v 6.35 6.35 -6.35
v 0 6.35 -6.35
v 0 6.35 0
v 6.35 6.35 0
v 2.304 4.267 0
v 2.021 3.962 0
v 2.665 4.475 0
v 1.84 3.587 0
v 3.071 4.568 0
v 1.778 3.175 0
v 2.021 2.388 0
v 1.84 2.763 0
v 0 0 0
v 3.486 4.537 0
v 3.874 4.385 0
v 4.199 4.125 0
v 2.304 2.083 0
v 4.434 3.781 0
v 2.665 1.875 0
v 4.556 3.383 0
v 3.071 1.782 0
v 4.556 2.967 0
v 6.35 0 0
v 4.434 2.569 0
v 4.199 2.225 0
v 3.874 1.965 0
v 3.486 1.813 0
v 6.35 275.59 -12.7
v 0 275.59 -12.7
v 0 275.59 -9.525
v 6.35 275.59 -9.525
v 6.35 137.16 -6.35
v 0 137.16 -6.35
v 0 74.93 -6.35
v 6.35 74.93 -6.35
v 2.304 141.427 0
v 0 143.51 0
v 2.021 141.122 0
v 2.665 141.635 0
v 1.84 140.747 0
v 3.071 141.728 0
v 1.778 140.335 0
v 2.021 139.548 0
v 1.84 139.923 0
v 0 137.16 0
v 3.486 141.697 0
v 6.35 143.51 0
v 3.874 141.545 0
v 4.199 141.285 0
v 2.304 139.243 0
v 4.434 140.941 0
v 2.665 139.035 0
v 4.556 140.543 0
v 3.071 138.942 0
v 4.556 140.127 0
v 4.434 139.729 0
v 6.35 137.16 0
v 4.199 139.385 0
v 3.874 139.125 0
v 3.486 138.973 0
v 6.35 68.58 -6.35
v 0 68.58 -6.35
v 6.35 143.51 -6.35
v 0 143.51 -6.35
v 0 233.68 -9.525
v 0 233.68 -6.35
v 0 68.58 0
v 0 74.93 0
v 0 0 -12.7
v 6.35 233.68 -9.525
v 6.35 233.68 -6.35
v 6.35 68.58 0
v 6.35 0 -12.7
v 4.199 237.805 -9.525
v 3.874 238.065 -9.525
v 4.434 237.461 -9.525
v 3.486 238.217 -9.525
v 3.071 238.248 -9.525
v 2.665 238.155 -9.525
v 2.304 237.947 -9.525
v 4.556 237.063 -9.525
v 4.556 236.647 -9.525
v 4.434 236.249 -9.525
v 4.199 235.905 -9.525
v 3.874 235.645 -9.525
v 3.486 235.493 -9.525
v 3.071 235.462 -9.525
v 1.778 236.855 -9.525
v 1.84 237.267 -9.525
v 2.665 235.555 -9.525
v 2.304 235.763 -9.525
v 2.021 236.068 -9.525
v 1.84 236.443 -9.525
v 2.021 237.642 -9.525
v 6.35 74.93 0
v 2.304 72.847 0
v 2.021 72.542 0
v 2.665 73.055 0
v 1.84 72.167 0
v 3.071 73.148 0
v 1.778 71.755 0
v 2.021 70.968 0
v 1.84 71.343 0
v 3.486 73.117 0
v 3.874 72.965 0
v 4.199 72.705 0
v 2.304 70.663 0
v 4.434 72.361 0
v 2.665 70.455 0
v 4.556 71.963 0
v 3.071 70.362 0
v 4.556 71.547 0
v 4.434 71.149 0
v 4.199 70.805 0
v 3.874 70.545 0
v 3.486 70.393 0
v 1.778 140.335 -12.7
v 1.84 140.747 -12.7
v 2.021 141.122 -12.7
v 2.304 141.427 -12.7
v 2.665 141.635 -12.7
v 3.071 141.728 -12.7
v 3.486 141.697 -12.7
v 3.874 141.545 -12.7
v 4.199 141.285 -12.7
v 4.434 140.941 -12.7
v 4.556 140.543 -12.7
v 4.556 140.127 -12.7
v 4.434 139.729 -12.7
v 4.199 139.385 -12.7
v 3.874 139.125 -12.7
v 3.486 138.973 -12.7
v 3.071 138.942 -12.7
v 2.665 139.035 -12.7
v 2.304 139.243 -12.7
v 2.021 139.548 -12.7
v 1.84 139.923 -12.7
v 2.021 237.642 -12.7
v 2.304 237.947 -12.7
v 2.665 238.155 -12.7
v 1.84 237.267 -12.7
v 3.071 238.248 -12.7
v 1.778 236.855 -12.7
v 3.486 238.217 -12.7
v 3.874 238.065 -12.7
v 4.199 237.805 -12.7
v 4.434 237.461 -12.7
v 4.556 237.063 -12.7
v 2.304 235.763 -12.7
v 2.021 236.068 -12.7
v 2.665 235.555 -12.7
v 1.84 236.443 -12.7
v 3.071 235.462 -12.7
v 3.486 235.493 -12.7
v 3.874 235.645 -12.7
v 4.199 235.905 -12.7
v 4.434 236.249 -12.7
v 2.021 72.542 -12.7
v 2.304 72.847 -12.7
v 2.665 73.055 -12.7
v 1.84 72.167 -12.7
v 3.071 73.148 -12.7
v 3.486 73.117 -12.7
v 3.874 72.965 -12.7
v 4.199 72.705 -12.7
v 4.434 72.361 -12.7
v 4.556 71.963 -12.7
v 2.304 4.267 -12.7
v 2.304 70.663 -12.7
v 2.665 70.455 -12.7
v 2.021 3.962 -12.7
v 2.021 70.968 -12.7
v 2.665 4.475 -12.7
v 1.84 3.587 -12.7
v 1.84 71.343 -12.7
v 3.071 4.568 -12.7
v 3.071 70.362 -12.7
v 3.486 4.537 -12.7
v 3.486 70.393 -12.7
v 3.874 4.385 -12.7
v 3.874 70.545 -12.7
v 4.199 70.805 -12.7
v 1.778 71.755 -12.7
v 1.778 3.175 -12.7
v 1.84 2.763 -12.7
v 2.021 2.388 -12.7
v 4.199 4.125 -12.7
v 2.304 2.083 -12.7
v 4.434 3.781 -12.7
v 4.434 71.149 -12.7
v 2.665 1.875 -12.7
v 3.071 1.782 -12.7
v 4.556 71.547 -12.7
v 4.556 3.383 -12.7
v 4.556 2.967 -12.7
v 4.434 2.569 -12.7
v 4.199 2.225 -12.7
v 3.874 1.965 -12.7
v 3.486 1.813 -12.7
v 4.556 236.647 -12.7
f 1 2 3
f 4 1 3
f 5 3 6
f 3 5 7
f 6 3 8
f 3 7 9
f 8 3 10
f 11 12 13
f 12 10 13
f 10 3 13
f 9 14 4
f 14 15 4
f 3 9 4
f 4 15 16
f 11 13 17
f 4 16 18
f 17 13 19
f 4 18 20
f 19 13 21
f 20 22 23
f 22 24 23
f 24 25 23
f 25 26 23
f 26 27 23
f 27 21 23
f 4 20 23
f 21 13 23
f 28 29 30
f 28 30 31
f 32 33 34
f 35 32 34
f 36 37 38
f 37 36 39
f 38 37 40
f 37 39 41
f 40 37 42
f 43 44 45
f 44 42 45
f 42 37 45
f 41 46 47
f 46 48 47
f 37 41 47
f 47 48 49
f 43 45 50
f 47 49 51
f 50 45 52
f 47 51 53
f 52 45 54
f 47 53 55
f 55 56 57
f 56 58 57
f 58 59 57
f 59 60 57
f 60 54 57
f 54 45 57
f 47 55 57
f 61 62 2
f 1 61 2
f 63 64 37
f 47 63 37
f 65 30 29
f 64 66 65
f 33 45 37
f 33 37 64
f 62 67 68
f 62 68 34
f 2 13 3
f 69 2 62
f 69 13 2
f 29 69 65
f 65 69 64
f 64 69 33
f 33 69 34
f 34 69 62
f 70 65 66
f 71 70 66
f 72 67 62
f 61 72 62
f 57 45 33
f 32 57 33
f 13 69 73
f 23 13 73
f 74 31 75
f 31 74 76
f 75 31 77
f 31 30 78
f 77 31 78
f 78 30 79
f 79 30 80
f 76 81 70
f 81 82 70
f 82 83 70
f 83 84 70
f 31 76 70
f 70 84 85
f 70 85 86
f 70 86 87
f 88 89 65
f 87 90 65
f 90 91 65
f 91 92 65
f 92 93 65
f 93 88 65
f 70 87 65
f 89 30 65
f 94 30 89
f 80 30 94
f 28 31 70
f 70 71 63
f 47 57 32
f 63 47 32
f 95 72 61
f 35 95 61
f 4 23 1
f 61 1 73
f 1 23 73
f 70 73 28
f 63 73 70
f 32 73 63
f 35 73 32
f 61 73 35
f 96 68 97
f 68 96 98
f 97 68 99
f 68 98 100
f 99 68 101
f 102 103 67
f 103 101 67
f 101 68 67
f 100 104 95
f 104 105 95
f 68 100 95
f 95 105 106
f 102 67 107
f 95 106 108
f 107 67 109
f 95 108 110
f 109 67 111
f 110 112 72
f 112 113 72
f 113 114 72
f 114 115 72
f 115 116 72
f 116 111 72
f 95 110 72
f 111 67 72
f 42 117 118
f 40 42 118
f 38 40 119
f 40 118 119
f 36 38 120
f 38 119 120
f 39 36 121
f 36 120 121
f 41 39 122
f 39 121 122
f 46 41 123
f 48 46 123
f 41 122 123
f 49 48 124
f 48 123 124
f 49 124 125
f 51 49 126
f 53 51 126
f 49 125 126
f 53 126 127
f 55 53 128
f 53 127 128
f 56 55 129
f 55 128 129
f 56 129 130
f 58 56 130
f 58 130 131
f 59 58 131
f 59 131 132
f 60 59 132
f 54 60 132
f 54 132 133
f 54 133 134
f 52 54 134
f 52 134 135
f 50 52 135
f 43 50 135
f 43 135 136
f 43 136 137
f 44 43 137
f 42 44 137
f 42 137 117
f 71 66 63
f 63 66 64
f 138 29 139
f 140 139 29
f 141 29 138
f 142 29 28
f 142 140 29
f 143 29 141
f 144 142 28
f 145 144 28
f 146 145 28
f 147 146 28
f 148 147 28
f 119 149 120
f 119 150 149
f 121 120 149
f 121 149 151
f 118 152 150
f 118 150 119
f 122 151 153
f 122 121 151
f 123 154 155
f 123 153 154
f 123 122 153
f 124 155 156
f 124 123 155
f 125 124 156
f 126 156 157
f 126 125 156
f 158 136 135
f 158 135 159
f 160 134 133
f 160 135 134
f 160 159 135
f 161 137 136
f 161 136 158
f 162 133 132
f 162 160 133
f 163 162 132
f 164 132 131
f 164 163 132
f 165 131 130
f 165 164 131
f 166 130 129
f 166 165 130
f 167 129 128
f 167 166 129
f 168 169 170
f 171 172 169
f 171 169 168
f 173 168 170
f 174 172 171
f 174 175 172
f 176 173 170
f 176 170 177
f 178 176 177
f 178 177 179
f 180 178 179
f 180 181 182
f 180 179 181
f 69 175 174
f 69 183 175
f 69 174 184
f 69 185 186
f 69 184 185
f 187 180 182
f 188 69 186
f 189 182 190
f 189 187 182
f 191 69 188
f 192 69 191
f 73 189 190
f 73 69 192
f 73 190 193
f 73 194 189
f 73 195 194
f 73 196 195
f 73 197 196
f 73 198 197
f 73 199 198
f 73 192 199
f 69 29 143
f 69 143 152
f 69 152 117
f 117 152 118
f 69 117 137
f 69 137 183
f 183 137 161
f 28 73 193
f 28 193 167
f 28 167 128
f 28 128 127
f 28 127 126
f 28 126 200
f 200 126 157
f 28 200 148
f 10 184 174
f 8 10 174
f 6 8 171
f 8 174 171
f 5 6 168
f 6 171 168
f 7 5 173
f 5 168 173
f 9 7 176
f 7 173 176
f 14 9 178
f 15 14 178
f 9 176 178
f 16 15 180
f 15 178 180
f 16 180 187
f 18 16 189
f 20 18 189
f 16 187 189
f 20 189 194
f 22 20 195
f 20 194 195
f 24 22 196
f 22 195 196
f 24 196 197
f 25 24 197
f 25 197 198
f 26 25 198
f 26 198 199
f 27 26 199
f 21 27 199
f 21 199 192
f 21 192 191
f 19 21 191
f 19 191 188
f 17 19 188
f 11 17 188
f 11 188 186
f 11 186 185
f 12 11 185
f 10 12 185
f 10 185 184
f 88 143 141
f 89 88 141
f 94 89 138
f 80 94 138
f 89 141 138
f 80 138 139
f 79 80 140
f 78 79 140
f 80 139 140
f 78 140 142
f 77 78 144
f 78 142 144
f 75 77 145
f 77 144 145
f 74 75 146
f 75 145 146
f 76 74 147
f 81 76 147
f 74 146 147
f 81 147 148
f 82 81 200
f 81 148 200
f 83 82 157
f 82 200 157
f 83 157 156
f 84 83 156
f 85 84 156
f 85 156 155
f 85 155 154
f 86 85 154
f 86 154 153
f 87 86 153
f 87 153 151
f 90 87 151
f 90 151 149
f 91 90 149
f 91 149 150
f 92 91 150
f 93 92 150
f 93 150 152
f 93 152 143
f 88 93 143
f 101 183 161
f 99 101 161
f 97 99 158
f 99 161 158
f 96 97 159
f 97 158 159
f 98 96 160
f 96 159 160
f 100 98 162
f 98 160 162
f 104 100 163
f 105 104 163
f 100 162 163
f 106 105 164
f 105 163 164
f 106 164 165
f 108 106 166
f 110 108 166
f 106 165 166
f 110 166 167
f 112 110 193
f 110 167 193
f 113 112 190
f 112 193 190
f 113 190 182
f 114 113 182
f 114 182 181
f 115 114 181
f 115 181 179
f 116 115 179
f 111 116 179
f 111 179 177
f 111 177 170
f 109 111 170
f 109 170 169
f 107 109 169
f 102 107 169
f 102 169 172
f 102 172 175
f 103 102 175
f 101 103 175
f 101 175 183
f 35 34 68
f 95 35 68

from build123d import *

# Parameters (mm, degrees)
SKETCH1_W                  = 6.35
SKETCH1_H                  = 12.7
BOSS_EXTRUDE1_DEPTH        = 275.59
CUT_EXTRUDE_THIN1_DEPTH    = 276.955540984
F_35_0_11_DIAMETER_HOLE1_D = 2.794


with BuildPart() as part:
    # Sketch1 → Boss-Extrude1 (new body)
    with BuildSketch(Plane(origin=(0, 0, 0), x_dir=(1, 0, 0), z_dir=(0, 1, 0))):
        with Locations((3.175, 6.35)):
            Rectangle(SKETCH1_W, SKETCH1_H)
    extrude(amount=BOSS_EXTRUDE1_DEPTH)

    # Sketch2 → Cut-Extrude-Thin1 (cut, through all)
    with BuildSketch(Plane.ZY):
        Polygon((0, 233.68), (-9.525, 233.68), (-9.525, 275.59), (-9.52510033, 275.59), (-9.52510033, 233.67989967), (0, 233.67989967), align=None)
        Polygon((0, 143.51), (-6.35, 143.51), (-6.35, 233.68), (-6.35010033, 233.68), (-6.35010033, 143.50989967), (0, 143.50989967), align=None)
        Polygon((0, 137.16), (-6.35, 137.16), (-6.35, 74.93), (0, 74.93), (0, 74.93010033), (-6.34989967, 74.93010033), (-6.34989967, 137.15989967), (0, 137.15989967), align=None)
        Polygon((0, 68.58), (-6.35, 68.58), (-6.35, 6.35), (0, 6.35), (0, 6.35010033), (-6.34989967, 6.35010033), (-6.34989967, 68.57989967), (0, 68.57989967), align=None)
    extrude(amount=-CUT_EXTRUDE_THIN1_DEPTH, mode=Mode.SUBTRACT)


with BuildPart() as cut_extrude_thin1_kept_piece:
    # of the separate pieces the step leaves, the one the design keeps (cut_extrude_thin1_pieces_kept)
    add(part.part.solids().sort_by_distance((0, 0, 0))[0])

    # #35 (0.11) Diameter Hole1 (through all)
    with Locations(Plane.XY):
        with Locations((3.175, 236.855), (3.175, 140.335), (3.175, 71.755), (3.175, 3.175)):
            Hole(F_35_0_11_DIAMETER_HOLE1_D / 2)


solid = cut_extrude_thin1_kept_piece.part
